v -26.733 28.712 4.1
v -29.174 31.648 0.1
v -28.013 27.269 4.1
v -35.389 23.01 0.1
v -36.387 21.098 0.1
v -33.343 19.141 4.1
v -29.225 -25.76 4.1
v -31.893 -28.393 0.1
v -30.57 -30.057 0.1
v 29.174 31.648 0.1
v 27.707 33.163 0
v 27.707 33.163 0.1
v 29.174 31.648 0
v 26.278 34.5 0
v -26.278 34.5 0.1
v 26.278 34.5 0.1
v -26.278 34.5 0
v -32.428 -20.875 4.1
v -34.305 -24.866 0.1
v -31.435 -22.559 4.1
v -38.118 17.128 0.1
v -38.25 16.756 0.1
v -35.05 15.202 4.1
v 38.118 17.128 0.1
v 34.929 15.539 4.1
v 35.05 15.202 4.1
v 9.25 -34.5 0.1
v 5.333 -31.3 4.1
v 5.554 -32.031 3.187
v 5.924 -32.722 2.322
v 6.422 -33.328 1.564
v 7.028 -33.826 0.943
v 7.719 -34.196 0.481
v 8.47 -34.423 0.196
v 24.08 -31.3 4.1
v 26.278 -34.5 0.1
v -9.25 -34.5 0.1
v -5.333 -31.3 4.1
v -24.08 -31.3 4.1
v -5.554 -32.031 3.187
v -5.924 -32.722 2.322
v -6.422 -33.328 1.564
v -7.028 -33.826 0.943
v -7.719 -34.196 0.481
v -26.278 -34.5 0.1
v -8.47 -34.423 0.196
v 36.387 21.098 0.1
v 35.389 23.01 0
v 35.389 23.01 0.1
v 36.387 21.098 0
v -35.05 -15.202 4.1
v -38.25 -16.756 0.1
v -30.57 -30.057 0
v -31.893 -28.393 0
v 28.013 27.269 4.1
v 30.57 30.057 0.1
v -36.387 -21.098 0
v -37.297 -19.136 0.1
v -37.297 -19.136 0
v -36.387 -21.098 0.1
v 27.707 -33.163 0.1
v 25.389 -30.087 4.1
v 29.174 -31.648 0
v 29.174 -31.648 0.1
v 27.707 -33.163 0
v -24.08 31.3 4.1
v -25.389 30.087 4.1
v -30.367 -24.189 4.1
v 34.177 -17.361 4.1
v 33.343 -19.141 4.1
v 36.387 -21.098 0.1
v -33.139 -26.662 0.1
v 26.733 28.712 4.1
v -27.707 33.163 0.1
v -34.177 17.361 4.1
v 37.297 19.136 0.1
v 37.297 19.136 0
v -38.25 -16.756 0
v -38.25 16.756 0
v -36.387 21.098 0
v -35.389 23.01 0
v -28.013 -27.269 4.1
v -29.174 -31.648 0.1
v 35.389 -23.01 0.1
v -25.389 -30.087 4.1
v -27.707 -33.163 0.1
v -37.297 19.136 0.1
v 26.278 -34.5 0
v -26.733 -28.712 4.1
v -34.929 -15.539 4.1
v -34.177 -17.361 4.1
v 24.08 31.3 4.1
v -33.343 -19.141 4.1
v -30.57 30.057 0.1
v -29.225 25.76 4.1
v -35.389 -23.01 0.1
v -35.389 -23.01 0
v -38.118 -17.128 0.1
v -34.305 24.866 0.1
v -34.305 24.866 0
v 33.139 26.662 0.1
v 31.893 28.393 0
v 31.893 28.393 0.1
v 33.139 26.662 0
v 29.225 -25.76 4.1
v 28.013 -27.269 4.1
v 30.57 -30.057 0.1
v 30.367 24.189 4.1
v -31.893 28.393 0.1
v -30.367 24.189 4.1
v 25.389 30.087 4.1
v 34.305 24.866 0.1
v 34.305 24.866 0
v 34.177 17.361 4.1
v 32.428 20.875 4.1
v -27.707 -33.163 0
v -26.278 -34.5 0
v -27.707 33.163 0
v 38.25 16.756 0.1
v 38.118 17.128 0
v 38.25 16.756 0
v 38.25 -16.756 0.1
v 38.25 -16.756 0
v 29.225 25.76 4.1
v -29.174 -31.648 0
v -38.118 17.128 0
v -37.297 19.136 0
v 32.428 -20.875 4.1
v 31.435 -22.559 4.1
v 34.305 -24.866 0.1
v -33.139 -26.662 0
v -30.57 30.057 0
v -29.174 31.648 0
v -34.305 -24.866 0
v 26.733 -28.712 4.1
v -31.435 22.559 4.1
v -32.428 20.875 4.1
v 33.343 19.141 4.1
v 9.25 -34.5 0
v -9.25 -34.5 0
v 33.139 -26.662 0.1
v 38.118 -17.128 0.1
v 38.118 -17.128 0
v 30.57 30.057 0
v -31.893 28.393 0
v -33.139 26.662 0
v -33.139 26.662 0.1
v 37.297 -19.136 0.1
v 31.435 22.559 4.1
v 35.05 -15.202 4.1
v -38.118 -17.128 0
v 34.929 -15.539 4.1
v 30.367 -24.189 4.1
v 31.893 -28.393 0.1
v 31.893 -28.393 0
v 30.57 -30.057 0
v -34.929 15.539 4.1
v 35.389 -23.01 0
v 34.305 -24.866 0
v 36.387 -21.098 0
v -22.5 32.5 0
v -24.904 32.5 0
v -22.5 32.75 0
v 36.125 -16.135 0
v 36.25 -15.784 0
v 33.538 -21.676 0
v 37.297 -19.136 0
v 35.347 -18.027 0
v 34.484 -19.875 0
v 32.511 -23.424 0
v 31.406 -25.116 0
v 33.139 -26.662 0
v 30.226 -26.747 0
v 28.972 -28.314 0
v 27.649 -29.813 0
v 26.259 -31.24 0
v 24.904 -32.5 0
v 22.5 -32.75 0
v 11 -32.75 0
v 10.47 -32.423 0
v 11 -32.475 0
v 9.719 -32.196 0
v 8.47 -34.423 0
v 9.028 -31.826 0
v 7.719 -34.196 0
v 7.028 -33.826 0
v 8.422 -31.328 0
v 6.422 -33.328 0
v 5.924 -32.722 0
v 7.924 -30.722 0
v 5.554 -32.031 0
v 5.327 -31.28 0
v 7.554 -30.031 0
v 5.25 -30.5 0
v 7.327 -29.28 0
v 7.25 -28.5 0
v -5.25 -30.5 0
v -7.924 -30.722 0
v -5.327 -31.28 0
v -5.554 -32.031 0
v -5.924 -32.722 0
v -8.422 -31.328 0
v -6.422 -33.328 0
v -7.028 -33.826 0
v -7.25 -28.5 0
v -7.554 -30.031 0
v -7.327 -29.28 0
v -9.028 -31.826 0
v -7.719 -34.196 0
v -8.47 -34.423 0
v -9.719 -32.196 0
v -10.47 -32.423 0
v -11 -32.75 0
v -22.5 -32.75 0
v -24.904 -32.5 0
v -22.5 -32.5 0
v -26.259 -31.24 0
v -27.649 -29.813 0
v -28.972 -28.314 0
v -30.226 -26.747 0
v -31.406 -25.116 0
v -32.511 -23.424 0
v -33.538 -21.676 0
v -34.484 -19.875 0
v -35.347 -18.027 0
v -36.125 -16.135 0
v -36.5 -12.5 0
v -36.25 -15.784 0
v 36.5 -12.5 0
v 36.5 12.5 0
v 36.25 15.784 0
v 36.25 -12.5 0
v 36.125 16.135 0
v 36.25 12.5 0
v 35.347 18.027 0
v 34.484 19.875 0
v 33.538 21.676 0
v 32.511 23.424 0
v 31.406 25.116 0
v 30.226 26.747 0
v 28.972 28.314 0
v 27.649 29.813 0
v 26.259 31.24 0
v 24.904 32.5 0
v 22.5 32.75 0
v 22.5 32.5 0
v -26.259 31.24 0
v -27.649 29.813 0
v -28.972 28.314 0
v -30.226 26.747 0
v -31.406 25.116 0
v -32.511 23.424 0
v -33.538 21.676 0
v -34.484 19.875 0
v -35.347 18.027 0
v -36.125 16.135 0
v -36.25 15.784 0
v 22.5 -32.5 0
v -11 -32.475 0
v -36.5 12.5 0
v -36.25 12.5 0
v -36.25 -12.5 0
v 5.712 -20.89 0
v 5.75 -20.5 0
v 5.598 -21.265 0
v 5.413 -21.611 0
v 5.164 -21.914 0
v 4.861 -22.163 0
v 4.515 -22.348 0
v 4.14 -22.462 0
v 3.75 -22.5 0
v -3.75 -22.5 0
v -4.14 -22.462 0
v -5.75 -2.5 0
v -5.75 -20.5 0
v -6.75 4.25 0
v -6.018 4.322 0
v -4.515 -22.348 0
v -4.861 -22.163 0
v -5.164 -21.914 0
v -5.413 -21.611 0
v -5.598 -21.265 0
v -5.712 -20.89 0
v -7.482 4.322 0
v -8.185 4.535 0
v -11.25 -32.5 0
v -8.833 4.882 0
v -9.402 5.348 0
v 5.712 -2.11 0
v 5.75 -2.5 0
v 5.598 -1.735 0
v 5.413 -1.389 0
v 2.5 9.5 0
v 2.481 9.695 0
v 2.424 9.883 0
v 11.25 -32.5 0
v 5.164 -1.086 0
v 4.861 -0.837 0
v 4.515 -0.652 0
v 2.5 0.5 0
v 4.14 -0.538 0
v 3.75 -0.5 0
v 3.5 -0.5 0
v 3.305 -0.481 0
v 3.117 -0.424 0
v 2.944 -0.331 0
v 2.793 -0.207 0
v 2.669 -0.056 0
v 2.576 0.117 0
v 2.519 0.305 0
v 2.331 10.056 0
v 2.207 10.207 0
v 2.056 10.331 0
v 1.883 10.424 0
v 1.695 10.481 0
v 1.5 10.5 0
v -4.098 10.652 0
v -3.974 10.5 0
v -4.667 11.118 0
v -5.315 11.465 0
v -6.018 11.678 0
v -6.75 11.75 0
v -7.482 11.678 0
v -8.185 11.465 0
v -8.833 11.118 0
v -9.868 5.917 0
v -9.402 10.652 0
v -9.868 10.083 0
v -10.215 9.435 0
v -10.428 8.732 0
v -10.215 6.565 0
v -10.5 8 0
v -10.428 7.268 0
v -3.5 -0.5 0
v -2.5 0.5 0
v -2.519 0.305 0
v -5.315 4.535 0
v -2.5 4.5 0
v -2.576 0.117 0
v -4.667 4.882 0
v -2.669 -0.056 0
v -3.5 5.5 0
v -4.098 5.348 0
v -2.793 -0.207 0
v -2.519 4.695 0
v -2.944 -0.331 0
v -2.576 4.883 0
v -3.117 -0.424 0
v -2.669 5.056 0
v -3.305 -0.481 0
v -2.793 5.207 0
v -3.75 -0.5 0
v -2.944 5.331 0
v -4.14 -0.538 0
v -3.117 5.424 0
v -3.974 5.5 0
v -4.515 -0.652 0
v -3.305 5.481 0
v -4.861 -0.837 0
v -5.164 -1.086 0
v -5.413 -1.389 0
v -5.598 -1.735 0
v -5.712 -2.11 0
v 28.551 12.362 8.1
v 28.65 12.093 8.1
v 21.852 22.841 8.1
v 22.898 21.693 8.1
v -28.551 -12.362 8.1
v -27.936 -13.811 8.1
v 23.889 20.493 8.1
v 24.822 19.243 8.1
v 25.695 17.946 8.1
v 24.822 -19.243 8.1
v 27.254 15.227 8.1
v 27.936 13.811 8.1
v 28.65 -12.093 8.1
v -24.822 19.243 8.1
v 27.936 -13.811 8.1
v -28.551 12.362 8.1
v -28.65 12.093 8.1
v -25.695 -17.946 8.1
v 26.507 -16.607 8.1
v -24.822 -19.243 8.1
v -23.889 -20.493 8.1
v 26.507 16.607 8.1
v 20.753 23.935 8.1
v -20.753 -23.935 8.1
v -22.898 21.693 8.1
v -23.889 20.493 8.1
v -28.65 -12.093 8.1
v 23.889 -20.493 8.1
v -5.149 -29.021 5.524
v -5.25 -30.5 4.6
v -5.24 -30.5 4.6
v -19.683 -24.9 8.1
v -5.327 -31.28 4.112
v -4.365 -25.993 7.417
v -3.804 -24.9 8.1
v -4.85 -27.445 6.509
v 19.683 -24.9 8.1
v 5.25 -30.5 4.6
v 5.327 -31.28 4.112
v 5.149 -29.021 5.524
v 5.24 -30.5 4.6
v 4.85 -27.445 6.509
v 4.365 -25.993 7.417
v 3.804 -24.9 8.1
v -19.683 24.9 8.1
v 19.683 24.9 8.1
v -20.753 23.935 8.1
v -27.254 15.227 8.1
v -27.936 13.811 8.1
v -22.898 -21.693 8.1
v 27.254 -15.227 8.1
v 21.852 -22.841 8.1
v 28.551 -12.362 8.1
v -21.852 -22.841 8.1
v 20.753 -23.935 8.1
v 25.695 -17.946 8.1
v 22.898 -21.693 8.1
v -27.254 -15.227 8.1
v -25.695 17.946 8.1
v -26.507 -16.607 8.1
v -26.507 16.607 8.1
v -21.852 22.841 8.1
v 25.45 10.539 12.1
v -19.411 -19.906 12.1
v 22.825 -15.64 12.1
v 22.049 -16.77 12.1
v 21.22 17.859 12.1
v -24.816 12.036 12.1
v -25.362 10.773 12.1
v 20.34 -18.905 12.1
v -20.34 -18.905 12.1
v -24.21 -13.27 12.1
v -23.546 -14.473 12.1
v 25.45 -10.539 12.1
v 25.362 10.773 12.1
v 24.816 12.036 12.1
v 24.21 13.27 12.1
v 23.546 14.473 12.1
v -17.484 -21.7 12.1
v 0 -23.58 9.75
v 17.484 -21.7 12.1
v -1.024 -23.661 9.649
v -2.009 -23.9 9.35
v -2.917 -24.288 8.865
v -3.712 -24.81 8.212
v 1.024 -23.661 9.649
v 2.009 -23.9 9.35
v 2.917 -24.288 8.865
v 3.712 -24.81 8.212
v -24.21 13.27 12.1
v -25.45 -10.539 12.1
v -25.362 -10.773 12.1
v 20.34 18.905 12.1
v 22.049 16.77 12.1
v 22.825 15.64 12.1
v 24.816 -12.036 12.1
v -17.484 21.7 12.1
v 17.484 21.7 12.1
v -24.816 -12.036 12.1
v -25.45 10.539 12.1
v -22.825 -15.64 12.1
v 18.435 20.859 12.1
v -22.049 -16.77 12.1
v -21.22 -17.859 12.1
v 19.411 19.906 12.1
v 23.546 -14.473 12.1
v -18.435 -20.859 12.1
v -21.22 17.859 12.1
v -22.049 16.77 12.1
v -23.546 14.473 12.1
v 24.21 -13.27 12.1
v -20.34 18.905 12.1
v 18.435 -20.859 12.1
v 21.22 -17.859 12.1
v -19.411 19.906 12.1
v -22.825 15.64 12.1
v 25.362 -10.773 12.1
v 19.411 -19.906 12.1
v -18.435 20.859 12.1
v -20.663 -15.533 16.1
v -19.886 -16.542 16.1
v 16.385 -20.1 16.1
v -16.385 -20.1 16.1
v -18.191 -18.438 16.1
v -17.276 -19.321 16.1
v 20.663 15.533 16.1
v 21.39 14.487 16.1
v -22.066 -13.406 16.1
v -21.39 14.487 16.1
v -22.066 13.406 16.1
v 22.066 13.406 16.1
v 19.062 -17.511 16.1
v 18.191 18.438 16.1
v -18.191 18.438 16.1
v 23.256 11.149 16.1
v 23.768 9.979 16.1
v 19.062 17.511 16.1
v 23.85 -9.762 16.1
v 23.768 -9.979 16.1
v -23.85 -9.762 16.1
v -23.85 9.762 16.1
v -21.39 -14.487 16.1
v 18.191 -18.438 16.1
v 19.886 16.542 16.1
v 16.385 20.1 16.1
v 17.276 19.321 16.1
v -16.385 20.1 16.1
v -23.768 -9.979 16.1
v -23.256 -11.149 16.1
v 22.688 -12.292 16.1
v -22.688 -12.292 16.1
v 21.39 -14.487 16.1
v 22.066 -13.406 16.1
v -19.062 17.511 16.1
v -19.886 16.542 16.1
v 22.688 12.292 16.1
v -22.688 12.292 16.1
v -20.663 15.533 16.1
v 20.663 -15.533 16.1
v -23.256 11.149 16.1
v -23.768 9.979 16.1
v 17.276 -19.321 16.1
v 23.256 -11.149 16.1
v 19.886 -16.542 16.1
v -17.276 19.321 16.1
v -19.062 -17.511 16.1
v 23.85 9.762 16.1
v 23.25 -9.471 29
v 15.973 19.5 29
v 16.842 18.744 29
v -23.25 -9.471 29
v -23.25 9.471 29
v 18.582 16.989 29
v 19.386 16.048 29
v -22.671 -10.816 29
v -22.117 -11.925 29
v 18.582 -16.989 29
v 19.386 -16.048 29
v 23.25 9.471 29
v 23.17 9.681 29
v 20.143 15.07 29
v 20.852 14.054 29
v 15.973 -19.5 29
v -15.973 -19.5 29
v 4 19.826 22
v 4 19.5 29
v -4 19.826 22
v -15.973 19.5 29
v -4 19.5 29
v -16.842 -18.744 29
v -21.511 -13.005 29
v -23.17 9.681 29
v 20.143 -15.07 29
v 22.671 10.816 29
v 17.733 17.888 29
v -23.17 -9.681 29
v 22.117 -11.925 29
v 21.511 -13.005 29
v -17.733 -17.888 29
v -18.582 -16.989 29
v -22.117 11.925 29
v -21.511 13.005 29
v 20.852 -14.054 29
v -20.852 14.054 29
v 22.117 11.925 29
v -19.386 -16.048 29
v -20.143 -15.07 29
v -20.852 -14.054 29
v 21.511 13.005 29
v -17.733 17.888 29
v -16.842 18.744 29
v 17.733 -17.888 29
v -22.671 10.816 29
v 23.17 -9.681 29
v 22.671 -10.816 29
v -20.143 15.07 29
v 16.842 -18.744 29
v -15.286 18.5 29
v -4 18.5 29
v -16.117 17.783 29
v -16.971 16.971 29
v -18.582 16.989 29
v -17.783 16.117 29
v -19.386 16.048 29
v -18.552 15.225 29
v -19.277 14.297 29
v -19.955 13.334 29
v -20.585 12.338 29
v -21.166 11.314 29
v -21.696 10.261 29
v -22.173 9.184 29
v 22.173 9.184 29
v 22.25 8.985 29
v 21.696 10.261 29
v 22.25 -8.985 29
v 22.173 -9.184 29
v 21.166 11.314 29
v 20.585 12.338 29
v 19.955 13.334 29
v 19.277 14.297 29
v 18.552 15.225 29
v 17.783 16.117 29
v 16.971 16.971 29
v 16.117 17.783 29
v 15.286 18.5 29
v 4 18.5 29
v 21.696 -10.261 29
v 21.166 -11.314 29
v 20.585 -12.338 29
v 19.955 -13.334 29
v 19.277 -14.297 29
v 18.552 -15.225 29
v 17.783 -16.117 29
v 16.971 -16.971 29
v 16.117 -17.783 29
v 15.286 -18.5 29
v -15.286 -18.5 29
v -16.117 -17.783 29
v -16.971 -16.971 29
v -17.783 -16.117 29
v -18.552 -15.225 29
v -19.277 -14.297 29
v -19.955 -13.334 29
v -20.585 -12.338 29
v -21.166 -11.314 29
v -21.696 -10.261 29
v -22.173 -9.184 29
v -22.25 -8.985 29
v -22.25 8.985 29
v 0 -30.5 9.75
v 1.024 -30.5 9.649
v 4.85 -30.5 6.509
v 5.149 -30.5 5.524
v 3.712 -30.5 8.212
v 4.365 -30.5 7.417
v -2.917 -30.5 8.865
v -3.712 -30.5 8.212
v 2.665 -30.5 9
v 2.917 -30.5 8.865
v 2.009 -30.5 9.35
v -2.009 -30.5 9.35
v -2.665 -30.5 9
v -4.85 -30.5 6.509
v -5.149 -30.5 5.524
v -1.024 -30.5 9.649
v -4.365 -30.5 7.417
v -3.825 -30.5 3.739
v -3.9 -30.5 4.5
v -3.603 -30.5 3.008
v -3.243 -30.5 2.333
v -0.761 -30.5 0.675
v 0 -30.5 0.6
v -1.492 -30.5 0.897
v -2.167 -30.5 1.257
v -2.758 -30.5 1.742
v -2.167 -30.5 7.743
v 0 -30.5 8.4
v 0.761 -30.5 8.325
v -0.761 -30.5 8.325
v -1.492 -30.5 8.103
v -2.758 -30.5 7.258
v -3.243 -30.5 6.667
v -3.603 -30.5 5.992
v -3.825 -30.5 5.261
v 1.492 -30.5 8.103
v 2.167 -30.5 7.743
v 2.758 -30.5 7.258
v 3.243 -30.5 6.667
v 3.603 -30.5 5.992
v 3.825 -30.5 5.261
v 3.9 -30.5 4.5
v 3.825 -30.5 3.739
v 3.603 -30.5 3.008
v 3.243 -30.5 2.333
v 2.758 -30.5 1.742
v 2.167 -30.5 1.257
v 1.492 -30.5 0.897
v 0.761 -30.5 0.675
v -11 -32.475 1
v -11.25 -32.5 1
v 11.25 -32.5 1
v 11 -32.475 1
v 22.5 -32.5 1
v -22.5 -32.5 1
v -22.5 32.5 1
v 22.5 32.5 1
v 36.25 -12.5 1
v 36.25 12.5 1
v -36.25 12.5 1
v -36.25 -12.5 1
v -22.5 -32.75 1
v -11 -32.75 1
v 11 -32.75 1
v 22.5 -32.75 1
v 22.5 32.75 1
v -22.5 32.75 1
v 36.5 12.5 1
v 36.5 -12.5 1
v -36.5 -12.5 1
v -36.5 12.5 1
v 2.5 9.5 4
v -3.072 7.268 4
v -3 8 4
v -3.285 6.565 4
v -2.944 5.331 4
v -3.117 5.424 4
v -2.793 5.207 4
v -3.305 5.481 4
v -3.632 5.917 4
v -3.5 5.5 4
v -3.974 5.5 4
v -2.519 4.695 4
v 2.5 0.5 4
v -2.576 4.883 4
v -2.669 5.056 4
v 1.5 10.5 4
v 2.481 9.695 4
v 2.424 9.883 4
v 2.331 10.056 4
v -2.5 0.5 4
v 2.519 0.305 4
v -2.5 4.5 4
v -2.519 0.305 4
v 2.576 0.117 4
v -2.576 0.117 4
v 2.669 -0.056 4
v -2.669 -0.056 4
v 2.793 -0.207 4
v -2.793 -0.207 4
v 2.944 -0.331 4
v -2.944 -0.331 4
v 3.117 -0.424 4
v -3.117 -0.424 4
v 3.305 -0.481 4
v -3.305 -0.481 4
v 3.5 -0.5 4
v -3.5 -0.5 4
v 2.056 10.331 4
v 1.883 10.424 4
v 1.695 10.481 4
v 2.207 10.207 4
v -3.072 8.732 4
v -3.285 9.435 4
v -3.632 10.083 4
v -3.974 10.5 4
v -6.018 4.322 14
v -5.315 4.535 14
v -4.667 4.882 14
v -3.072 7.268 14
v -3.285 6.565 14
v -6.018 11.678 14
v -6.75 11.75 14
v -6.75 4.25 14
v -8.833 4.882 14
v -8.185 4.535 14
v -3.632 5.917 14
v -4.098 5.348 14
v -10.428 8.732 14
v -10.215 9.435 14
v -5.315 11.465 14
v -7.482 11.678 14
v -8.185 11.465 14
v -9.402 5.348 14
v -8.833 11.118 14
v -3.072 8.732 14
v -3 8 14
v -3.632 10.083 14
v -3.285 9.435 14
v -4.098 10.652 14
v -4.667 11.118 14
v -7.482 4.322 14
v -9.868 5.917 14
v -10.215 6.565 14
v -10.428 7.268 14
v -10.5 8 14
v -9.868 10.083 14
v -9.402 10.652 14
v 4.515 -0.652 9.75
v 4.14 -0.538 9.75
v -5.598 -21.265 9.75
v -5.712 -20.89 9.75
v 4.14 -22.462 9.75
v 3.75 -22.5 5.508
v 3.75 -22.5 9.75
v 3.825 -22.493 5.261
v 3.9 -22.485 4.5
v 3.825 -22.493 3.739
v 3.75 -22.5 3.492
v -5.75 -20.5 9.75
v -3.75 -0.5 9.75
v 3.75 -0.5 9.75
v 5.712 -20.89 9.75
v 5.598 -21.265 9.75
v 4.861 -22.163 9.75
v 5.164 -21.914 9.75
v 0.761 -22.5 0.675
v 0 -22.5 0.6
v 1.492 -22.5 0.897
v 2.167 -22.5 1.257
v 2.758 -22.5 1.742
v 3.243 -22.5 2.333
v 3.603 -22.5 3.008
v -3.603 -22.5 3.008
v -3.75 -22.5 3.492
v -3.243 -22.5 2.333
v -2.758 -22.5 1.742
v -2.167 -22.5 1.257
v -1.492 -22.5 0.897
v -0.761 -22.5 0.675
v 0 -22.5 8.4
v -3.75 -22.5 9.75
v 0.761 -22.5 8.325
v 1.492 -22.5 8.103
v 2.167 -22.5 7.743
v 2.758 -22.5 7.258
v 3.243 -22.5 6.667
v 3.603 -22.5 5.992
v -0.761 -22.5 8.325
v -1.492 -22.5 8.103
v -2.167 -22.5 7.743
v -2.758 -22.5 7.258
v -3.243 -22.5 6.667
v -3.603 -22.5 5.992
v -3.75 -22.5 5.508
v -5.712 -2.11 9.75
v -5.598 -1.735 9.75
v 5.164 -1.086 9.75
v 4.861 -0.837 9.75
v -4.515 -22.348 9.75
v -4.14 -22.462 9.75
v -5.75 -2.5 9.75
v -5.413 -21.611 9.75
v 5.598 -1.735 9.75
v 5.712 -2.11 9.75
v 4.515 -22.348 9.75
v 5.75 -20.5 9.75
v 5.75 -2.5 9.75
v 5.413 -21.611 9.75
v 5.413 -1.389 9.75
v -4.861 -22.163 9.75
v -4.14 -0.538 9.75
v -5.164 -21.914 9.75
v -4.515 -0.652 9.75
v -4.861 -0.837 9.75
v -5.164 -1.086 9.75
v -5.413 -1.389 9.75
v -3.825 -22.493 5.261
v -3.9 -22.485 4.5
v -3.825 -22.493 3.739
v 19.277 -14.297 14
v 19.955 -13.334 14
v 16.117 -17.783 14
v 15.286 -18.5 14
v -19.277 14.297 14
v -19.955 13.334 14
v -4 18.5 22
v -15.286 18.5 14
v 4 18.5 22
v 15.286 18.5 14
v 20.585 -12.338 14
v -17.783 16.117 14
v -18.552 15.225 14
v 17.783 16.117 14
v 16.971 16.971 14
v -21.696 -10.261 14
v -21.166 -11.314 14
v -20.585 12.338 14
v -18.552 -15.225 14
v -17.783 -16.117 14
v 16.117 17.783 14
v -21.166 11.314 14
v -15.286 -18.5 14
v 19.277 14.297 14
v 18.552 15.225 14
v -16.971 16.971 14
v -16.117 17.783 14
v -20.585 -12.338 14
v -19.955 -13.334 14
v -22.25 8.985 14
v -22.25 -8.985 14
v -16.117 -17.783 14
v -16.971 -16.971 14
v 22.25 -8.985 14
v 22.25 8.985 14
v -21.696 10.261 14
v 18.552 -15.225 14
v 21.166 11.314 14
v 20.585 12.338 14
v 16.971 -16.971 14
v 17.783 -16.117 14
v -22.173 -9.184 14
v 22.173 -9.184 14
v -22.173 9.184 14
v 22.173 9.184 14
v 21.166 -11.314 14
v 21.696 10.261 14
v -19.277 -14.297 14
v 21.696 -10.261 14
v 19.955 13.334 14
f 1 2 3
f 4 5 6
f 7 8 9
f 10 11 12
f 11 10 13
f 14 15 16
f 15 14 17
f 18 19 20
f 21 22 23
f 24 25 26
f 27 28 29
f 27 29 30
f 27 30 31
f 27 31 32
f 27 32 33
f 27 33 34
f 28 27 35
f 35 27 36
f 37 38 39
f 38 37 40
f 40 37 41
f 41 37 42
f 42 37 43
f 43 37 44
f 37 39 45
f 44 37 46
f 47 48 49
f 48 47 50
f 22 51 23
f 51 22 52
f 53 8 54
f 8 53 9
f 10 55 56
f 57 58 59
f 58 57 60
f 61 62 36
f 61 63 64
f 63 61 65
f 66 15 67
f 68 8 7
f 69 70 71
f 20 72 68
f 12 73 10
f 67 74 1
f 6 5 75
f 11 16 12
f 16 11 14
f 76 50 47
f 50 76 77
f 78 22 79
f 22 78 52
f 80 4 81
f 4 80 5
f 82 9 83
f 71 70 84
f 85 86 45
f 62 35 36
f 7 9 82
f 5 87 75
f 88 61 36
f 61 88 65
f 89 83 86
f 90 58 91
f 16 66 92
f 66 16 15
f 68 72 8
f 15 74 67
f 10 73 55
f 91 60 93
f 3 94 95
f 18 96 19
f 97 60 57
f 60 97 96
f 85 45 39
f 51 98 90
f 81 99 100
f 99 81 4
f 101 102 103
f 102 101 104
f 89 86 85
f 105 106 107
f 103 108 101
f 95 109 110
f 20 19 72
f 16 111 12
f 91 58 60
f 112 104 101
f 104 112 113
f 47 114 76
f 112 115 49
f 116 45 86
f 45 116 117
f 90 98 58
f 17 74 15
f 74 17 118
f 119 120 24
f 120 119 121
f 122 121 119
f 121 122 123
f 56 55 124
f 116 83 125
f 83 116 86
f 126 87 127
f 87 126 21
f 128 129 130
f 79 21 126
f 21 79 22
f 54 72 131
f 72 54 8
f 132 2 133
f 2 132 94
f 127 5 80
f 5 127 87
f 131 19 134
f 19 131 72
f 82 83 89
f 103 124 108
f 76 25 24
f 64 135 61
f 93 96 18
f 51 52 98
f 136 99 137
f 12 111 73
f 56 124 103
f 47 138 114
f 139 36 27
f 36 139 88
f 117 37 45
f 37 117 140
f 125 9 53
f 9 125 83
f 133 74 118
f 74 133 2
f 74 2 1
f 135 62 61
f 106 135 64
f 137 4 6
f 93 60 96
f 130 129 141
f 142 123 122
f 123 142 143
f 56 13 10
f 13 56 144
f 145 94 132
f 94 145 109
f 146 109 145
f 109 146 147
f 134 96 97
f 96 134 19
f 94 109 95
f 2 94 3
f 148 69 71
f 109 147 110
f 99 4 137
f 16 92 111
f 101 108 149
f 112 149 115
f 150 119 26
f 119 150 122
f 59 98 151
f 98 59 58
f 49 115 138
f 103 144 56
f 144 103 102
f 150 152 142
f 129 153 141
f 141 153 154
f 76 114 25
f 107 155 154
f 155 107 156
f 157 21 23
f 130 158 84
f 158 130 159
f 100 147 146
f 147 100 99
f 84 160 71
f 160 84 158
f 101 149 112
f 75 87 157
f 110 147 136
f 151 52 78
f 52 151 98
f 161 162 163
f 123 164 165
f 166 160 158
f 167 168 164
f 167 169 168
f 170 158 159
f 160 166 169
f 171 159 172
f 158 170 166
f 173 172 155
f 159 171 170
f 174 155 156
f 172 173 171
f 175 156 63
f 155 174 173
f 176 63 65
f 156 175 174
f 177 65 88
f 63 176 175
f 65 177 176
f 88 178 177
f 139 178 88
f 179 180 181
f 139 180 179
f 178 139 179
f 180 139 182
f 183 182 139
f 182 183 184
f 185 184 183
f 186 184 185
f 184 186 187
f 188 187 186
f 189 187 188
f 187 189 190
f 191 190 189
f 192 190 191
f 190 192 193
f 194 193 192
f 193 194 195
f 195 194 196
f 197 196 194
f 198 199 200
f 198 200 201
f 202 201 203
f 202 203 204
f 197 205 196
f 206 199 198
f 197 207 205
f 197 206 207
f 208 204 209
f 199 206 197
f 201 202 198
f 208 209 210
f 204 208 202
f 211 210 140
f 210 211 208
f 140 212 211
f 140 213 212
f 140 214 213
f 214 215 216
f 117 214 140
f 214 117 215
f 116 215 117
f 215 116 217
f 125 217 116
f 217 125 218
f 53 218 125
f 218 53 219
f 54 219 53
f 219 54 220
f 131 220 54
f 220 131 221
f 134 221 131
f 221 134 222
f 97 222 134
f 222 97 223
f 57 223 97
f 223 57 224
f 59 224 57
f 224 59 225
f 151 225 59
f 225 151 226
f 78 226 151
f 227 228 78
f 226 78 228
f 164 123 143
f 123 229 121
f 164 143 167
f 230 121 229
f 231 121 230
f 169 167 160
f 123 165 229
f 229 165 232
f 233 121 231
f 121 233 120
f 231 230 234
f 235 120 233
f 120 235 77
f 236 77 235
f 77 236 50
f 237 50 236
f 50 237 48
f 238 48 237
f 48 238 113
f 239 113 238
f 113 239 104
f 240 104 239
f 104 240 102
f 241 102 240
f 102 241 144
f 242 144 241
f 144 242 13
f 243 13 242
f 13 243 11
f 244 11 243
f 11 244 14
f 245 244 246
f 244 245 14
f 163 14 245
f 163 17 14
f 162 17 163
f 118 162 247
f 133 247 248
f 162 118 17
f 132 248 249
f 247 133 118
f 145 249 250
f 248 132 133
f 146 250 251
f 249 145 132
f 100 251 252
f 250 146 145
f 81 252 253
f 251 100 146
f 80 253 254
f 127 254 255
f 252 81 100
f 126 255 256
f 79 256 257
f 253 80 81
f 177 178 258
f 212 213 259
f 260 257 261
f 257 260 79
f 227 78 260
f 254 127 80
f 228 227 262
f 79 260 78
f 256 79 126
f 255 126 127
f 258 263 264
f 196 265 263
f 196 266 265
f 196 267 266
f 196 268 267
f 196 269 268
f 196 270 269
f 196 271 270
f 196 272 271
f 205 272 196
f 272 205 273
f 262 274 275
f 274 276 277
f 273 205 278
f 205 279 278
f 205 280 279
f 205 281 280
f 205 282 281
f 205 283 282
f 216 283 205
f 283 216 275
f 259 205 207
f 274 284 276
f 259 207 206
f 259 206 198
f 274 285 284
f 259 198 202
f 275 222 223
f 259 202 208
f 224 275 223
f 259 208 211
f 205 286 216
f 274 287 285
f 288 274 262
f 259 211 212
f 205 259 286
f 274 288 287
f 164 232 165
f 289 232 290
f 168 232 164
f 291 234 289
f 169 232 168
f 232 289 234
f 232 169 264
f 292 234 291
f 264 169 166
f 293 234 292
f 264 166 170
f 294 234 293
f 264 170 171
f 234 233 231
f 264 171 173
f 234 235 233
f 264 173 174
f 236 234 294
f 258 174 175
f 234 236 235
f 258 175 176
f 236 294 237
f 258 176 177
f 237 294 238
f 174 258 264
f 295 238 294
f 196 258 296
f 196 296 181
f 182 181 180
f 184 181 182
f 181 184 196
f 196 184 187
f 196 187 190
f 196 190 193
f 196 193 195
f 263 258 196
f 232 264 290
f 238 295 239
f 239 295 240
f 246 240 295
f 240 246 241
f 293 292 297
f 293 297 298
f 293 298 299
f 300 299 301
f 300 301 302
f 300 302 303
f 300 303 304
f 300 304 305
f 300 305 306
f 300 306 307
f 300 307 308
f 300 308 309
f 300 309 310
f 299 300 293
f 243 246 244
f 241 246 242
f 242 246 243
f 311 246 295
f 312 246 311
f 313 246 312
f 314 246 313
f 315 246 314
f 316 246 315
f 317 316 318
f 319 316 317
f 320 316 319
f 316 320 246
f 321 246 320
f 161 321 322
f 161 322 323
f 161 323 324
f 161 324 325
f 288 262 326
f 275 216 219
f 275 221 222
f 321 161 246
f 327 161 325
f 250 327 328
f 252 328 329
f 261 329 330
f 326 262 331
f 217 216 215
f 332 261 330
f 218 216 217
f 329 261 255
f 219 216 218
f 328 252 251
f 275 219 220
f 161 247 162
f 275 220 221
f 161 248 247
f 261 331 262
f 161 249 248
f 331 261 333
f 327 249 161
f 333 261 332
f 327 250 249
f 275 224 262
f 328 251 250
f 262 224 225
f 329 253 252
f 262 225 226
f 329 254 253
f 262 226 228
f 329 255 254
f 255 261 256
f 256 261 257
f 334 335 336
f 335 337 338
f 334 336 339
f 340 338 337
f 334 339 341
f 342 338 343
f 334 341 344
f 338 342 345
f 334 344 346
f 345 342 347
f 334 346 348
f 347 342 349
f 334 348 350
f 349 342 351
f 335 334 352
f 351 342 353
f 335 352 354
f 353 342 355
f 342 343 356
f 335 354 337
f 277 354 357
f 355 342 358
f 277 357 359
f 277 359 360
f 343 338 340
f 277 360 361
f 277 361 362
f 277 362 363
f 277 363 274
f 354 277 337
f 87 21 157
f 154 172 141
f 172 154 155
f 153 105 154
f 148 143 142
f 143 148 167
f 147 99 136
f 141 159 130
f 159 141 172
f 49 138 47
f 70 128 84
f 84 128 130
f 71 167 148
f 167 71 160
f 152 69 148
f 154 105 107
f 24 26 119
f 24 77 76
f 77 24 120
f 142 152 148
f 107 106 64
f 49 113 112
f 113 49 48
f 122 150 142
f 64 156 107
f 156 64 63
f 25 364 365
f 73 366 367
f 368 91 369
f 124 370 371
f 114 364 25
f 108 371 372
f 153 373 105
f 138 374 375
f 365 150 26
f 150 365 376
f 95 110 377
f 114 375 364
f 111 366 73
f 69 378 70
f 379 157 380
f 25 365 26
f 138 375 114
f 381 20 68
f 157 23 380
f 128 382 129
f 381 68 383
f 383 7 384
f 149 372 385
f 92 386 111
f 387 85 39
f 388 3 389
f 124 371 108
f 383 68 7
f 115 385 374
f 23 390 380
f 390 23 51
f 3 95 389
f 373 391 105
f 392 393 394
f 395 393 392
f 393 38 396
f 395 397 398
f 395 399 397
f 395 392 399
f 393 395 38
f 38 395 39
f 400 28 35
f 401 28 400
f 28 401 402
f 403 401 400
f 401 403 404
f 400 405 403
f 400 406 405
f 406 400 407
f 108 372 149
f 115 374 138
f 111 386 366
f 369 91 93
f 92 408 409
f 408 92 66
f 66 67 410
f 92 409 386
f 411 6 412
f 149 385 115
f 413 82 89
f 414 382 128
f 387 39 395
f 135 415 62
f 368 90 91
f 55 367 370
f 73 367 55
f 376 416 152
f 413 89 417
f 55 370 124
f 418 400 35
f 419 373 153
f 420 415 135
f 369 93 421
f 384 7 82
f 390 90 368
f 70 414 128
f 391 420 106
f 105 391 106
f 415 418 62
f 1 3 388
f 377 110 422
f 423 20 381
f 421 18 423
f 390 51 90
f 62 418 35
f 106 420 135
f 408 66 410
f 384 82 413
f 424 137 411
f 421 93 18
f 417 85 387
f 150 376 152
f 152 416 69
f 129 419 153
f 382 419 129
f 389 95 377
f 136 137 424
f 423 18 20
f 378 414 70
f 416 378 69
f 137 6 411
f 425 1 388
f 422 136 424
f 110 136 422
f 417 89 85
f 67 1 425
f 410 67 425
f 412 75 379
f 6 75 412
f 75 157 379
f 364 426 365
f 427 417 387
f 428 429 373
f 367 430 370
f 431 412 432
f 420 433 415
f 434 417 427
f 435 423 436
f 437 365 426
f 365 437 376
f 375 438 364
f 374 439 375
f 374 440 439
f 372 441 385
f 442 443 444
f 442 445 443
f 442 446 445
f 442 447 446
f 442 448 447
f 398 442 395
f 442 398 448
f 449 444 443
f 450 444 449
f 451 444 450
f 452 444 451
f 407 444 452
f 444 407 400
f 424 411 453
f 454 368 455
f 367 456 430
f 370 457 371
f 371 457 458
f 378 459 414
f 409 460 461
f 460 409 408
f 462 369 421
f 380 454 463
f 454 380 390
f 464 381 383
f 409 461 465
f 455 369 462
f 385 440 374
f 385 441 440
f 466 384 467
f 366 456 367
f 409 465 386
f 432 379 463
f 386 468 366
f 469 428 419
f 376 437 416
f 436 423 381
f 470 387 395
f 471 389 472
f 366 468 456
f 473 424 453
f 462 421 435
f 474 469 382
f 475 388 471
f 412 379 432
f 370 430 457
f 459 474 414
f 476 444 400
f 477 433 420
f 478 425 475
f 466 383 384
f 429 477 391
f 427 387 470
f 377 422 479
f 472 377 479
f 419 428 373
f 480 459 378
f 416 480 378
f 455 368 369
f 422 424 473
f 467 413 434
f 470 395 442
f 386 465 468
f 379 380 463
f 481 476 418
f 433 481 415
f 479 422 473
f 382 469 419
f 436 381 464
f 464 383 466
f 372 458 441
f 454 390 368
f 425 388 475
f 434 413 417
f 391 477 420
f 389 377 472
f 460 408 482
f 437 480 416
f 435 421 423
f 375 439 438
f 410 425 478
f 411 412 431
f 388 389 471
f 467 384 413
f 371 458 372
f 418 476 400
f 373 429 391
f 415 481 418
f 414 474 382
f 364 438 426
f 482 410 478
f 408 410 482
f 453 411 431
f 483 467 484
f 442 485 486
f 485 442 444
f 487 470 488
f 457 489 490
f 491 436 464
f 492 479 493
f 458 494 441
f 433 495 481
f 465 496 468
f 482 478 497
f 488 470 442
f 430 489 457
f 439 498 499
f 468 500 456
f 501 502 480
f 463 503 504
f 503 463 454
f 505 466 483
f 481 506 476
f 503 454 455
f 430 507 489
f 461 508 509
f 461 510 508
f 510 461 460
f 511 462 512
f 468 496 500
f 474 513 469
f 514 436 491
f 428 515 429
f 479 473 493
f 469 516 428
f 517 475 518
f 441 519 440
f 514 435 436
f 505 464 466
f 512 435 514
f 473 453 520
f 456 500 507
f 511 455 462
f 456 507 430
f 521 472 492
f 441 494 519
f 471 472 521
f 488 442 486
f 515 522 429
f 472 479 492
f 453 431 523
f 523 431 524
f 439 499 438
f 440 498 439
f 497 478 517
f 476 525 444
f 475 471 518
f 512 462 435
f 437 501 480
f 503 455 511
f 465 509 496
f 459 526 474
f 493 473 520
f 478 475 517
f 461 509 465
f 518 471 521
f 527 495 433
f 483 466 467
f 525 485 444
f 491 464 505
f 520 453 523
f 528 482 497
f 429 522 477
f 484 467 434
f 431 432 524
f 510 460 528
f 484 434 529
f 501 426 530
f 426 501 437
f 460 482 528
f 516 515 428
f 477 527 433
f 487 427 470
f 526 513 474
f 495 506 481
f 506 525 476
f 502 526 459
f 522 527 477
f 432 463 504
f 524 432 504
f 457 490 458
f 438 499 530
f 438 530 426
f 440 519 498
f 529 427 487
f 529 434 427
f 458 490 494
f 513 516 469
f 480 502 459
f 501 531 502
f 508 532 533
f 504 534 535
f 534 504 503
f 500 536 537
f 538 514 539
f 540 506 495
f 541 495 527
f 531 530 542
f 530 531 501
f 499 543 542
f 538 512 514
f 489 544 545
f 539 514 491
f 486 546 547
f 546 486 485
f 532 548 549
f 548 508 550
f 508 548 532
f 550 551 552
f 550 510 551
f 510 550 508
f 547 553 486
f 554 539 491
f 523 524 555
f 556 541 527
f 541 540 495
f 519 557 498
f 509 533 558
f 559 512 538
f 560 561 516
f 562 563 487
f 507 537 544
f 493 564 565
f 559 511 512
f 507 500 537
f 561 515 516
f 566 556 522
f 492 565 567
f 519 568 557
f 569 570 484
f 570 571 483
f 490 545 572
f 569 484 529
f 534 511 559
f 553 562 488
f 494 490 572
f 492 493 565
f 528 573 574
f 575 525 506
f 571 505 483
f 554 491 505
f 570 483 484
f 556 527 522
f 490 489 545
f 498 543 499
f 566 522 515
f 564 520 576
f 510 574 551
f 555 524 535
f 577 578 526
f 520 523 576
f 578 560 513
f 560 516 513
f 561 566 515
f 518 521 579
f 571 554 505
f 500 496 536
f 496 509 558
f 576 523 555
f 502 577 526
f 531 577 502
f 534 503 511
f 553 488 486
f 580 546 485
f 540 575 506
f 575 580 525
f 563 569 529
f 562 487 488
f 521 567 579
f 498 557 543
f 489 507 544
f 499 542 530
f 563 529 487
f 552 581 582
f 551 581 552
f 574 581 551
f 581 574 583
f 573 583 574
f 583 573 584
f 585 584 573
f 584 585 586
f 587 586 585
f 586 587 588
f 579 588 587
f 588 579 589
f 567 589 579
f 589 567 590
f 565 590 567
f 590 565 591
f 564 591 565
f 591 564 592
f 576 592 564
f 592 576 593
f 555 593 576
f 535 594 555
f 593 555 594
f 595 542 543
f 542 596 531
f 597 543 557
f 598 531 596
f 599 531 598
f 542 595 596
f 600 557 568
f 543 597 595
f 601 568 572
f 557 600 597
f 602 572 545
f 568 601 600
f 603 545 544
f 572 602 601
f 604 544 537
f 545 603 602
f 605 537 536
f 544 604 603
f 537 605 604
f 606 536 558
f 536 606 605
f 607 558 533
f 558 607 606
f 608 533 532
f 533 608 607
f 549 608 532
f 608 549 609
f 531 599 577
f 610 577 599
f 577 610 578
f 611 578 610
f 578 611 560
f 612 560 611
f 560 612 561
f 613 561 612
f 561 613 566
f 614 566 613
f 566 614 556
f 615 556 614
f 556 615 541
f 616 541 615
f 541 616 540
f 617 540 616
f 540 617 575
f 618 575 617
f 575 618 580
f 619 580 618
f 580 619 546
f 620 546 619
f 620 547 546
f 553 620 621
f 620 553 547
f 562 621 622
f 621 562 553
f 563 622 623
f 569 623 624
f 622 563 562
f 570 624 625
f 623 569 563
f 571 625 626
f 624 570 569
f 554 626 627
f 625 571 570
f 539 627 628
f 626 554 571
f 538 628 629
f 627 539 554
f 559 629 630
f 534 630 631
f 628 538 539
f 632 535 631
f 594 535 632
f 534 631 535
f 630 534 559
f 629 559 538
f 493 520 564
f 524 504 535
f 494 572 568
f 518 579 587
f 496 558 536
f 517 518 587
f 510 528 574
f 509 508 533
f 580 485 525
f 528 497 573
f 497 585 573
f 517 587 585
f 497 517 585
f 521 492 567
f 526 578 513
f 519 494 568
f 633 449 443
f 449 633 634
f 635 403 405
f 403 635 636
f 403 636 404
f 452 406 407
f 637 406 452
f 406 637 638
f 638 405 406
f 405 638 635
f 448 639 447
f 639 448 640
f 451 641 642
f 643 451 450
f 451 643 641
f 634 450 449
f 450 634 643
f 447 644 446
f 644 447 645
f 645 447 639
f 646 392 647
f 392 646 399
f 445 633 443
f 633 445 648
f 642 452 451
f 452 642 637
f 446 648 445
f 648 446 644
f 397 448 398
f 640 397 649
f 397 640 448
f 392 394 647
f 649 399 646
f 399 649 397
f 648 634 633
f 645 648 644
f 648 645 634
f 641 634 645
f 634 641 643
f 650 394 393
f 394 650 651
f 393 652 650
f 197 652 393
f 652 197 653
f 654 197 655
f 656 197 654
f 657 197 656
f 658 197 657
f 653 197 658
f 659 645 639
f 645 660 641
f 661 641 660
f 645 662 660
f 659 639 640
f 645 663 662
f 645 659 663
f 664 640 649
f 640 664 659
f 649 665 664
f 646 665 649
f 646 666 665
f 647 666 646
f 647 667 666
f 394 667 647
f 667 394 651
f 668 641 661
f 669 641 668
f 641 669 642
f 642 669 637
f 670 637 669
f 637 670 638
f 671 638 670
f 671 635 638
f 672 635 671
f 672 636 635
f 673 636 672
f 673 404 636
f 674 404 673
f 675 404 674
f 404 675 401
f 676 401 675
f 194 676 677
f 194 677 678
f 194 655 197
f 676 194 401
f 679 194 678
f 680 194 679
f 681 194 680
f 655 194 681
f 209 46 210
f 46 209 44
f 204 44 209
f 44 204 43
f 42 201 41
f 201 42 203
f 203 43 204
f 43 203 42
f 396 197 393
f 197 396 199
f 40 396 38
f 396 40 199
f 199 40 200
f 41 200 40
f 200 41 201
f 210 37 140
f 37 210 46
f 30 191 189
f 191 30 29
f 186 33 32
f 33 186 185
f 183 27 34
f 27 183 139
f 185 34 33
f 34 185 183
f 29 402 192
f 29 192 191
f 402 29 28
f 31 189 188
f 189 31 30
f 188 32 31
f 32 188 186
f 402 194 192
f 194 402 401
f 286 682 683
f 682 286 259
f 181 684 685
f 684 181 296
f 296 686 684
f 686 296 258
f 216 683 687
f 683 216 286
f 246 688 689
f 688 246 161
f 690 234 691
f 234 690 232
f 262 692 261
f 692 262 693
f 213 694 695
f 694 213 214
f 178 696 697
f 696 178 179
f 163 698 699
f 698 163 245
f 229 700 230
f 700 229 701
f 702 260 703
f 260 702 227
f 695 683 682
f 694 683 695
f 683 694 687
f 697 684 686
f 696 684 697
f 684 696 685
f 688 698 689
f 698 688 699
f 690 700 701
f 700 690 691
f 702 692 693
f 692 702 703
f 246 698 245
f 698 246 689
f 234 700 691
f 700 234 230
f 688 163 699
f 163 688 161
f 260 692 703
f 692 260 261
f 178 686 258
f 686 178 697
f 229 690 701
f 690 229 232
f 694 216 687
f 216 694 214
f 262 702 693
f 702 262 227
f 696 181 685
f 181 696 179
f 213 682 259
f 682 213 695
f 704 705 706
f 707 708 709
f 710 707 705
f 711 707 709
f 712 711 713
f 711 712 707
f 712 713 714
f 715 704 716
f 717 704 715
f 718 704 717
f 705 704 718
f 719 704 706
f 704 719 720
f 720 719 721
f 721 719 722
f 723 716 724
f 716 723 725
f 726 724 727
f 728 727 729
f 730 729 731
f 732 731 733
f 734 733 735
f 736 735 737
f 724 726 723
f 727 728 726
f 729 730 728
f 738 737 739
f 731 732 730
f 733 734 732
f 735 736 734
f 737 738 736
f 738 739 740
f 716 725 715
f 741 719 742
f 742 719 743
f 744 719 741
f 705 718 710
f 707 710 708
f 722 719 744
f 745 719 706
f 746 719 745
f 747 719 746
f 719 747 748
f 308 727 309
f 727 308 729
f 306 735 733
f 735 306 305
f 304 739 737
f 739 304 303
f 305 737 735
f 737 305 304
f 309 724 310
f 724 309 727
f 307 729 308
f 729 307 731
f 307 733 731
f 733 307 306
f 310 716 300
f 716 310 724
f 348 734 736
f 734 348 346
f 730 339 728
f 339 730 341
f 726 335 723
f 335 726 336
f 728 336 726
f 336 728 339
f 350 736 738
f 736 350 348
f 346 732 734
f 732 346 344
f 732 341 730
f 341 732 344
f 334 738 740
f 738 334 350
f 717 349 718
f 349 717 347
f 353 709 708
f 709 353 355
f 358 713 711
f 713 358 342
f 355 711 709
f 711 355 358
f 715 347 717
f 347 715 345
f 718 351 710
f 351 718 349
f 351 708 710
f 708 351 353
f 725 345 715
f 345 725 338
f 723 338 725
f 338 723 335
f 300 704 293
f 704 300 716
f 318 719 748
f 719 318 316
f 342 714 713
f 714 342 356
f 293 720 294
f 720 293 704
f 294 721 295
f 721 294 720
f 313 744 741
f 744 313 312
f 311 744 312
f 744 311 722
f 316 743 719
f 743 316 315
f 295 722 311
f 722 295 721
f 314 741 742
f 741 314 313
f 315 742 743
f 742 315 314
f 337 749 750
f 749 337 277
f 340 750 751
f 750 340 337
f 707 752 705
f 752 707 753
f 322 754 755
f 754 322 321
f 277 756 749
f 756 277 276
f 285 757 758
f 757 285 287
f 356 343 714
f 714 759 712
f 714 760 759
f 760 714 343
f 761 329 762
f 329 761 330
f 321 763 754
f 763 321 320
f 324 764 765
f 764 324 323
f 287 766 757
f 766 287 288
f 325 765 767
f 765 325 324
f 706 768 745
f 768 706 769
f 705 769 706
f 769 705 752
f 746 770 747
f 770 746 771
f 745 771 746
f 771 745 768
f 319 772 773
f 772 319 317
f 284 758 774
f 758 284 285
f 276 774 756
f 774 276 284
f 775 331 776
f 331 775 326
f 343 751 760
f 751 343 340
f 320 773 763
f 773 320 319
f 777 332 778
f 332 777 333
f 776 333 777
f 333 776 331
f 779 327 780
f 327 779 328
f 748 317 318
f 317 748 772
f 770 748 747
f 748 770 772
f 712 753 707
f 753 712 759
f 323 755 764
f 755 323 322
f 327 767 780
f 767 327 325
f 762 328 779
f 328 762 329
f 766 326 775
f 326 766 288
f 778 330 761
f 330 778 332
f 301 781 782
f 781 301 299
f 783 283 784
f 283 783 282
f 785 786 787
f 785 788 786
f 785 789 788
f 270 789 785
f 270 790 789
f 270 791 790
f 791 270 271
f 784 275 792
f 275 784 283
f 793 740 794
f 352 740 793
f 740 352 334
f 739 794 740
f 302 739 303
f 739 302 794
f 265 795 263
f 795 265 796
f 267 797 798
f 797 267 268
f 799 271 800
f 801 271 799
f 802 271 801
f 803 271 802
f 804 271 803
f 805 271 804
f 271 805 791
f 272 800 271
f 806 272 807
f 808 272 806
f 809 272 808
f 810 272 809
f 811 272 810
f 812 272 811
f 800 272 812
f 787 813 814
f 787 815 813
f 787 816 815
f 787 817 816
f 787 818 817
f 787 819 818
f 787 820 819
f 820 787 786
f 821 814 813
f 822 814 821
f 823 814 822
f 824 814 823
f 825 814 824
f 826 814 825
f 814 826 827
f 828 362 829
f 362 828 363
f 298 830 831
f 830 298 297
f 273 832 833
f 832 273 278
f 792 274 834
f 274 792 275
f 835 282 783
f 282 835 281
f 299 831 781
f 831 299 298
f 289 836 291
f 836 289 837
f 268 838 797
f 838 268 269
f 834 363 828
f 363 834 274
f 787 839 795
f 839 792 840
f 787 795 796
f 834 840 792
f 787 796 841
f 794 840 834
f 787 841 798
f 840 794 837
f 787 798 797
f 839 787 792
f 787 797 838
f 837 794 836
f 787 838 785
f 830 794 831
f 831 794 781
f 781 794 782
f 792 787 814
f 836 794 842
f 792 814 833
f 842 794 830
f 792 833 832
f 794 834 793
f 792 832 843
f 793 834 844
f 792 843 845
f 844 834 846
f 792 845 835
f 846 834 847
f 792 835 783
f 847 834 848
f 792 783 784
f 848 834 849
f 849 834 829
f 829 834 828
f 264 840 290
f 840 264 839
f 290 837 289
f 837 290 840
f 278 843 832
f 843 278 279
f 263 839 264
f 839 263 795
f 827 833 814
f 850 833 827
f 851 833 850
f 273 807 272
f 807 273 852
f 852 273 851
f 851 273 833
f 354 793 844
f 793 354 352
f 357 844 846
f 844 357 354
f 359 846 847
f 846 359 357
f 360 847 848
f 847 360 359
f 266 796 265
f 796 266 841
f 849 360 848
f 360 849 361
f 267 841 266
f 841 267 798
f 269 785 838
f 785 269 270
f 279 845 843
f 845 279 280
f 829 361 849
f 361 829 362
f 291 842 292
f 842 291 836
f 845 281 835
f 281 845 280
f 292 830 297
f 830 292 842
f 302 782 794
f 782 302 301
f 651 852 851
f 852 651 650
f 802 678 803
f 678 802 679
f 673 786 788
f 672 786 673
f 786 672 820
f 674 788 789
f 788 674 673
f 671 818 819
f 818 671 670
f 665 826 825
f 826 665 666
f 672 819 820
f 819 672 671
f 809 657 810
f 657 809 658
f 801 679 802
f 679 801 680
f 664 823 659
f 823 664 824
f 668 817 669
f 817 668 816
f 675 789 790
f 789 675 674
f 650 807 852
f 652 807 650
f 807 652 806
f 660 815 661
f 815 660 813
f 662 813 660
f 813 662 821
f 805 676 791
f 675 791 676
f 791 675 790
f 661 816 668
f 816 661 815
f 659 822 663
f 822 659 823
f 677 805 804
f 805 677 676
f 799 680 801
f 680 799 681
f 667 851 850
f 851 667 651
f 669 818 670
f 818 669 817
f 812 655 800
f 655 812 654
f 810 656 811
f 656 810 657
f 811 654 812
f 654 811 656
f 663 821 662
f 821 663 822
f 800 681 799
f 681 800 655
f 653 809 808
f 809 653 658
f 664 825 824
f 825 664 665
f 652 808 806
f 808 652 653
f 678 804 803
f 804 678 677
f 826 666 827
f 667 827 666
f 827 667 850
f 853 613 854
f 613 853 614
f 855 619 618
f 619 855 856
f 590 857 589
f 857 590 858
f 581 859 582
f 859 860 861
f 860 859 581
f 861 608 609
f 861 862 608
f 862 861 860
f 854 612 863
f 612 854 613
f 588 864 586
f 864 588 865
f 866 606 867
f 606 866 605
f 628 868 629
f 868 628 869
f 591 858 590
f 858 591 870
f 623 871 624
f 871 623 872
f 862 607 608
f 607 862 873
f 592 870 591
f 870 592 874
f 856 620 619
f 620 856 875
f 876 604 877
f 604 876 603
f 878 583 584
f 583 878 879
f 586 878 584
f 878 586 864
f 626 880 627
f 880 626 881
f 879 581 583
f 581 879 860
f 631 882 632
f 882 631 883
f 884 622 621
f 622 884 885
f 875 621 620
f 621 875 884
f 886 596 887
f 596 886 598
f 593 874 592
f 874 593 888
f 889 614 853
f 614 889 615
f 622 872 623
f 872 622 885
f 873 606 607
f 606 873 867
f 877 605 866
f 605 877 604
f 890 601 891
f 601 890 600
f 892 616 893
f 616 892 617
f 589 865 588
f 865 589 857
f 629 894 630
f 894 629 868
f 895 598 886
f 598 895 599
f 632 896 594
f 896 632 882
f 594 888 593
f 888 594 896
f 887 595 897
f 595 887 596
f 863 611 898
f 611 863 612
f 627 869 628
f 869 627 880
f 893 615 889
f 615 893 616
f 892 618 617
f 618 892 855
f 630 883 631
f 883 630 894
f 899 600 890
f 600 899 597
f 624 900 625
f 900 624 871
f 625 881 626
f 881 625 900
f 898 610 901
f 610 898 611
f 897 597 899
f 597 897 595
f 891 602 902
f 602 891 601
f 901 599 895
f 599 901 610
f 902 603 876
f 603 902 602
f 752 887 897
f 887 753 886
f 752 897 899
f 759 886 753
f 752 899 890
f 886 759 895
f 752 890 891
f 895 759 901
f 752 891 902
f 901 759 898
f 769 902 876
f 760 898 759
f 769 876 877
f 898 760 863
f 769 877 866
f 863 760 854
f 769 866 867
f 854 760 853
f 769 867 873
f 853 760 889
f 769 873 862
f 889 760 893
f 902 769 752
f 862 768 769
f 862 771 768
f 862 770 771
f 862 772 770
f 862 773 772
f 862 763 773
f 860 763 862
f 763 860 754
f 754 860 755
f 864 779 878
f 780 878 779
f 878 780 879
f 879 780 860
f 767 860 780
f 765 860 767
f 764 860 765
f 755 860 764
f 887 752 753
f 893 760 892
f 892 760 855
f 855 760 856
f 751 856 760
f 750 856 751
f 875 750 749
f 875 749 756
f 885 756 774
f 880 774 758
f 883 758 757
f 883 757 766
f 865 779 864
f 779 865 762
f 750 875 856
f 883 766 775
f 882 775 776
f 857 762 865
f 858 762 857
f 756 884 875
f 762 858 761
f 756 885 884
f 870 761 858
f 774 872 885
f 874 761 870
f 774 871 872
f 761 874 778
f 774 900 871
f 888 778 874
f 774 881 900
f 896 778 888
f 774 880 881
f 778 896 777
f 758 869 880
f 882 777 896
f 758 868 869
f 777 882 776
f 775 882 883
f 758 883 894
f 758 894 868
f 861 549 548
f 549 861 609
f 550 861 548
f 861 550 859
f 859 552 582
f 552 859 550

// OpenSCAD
// file: plug.scad
use <shared.scad>;

module negative_jack_mount() {
  translate([6, 12.5, 6.5])
    rotate([90, 0, 0])
      cylinder(h=9, d=7.8, $fn=32);
}

module negative_power_plug() {
  translate([0, 0, -2])
    union() {
      cylinder(d=7.5, h=24, $fn=32);
    }
}

module inside_rounded_corner(height) {
  difference() {
    cube([1.5, 1.5, height]);

    translate([1.5, 1.5, -1])
      cylinder(r=1, h=height+2, $fn=32);
  }
}

module negative_wire_run() {
  translate([0, 3, 0])
    rounded_rect([4, 10, 8], 1);

  translate([-3.25, 8, 0])
    rounded_rect([10.5, 4, 8], 1);

  translate([2, -1, 0])
    inside_rounded_corner(8);

  translate([-2, -1, 0])
    rotate([0, 0, 90])
      inside_rounded_corner(8);

  translate([-2, 6, 0])
    rotate([0, 0, 180])
      inside_rounded_corner(8);
}

module negative_power_assembly() {
  union() {
    translate([-6.75, 8, 0])
      rotate([0, 0, -90])
        negative_power_plug();

    translate([0, 0, -2])
      negative_wire_run();

    // open space
    translate([0, -11.5, -2])
      rounded_rect([9.5, 20, 13.75], 2);

    translate([-6, -34.5, 0])
      negative_jack_mount();
  }
}
// file: shared.scad
module serial_hull() {
  for(i = [0 : $children-2]) {
    hull() {
      children(i);
      children(i+1);
    }
  }
}

module rounded_rect(size, radius) {
  x = size[0];
  y = size[1];
  z = size[2];

  linear_extrude(height=z)
  hull() {
    // place 4 circles in the corners, with the given radius
    translate([(-x/2)+(radius/2), (-y/2)+(radius/2), 0])
    circle(r=radius, $fn=32);

    translate([(x/2)-(radius/2), (-y/2)+(radius/2), 0])
    circle(r=radius, $fn=32);

    translate([(-x/2)+(radius/2), (y/2)-(radius/2), 0])
    circle(r=radius, $fn=32);

    translate([(x/2)-(radius/2), (y/2)-(radius/2), 0])
    circle(r=radius, $fn=32);
  }
}
// main file
use <shared.scad>;
use <plug.scad>;

solo_width = 44.5;
solo_depth = 37;

module solo_bottom() {
  half_width = solo_width/2;
  half_depth = solo_depth/2;

  difference() {
    circle(r=24, $fn=128);

    // round edges - width
    translate([-20, (-half_depth-10), 0])
      square([40, 10]);
    translate([-20, half_depth, 0])
      square([40, 10]);

    // round edges - depth
    translate([half_width, -10, 0])
      square([10, 20]);
    translate([(-half_width-10), -10, 0])
      square([10, 20]);
  }
}

module resized_bottom(extra) {
  resize([extra+solo_width, extra+solo_depth, 0])
    solo_bottom();
}

module cone_ring(resize_base, z, height=0.1) {
  translate([0, 0, z])
    linear_extrude(height, true)
      resized_bottom(resize_base);
}

module cone(resize_base) {
  resize_base = 32;
  curve_factor = 10;

  union() {
    // curvey profile
    serial_hull() {
      /*cone_ring(resize_base, 0);*/
      cone_ring(resize_base, 0);
      cone_ring(resize_base*(8/curve_factor), 4);
      cone_ring(resize_base*(4/curve_factor), 4*2);
      cone_ring(resize_base*(2/curve_factor), 4*3);
      cone_ring(resize_base*(1/curve_factor), 4*4);
      cone_ring(2, 20, 9);
    }

    // power jack tube
    difference() {
      translate([0, -22.5, 4.5])
        rotate([90, 0, 0])
          cylinder(h=8, d=10.5, $fn=32);

      translate([-5, -31.5, -2])
        cube([10, 10, 2]);
    }
  }
}

module power_jack_cutaway(extra_width=0) {
  radius = 4;
  width = 10.5 + extra_width;
  total_width = width + (radius * 2);
  offset = (width-10.5) / 2;

  translate([-9.25-offset, -35.5, -1])
    difference() {
      cube([total_width, 5, 10]);

      translate([0, 5, -1])
        cylinder(r=radius, h=12, $fn=32);

      translate([total_width, 5, -1])
        cylinder(r=radius, h=12, $fn=32);
    }
}

module base() {
  difference() {
    cone();

    // rounded outer edges near the power jack
    power_jack_cutaway();

    // slot to attach foot ring
    translate([0, 0, -2])
      foot_ring();

    // negative space for solo
    translate([0, 0, 14])
      linear_extrude(16, true)
        solo_bottom();

    // cutout to see charging lights
    translate([-4, 15, 22])
      cube([8, 8, 8]);

    translate([0, 0, -2])
      negative_power_assembly();
  }
}

module cone_ring_with_cutaway(outer, inner, height) {
  outer_diff = 32 - outer;
  inner_diff = 32 - inner;

  difference() {
    cone_ring(outer, 0, height);

    translate([0, outer_diff/2, 0])
      power_jack_cutaway(outer_diff);

    translate([0, 0, -1])
      difference() {
        cone_ring(inner, 0, height+2);

        translate([0, inner_diff/2, 0])
          power_jack_cutaway(inner_diff);
      }
  }
}

module foot_ring() {
  union() {
    // actual foot
    cone_ring_with_cutaway(32, 28, 2);

    // tabs to line up with base
    translate([0, 0, 2])
      difference() {
        cone_ring_with_cutaway(28.5, 28, 1);

        // remove the outer rounded corners
        translate([35, 25, 0])
          cube([25, 25, 3], center=true);
        translate([-35, 25, 0])
          cube([25, 25, 3], center=true);
        translate([35, -25, 0])
          cube([25, 25, 3], center=true);
        translate([-35, -25, 0])
          cube([25, 25, 3], center=true);

        // remove the rounded corners and the power jack
        translate([0, -30, 0])
          cube([22, 10, 3], center=true);
      }
  }
}

/*translate([0, -40, 0])*/
  base();

/*translate([0, 40, 0])*/
  /*foot_ring();*/
